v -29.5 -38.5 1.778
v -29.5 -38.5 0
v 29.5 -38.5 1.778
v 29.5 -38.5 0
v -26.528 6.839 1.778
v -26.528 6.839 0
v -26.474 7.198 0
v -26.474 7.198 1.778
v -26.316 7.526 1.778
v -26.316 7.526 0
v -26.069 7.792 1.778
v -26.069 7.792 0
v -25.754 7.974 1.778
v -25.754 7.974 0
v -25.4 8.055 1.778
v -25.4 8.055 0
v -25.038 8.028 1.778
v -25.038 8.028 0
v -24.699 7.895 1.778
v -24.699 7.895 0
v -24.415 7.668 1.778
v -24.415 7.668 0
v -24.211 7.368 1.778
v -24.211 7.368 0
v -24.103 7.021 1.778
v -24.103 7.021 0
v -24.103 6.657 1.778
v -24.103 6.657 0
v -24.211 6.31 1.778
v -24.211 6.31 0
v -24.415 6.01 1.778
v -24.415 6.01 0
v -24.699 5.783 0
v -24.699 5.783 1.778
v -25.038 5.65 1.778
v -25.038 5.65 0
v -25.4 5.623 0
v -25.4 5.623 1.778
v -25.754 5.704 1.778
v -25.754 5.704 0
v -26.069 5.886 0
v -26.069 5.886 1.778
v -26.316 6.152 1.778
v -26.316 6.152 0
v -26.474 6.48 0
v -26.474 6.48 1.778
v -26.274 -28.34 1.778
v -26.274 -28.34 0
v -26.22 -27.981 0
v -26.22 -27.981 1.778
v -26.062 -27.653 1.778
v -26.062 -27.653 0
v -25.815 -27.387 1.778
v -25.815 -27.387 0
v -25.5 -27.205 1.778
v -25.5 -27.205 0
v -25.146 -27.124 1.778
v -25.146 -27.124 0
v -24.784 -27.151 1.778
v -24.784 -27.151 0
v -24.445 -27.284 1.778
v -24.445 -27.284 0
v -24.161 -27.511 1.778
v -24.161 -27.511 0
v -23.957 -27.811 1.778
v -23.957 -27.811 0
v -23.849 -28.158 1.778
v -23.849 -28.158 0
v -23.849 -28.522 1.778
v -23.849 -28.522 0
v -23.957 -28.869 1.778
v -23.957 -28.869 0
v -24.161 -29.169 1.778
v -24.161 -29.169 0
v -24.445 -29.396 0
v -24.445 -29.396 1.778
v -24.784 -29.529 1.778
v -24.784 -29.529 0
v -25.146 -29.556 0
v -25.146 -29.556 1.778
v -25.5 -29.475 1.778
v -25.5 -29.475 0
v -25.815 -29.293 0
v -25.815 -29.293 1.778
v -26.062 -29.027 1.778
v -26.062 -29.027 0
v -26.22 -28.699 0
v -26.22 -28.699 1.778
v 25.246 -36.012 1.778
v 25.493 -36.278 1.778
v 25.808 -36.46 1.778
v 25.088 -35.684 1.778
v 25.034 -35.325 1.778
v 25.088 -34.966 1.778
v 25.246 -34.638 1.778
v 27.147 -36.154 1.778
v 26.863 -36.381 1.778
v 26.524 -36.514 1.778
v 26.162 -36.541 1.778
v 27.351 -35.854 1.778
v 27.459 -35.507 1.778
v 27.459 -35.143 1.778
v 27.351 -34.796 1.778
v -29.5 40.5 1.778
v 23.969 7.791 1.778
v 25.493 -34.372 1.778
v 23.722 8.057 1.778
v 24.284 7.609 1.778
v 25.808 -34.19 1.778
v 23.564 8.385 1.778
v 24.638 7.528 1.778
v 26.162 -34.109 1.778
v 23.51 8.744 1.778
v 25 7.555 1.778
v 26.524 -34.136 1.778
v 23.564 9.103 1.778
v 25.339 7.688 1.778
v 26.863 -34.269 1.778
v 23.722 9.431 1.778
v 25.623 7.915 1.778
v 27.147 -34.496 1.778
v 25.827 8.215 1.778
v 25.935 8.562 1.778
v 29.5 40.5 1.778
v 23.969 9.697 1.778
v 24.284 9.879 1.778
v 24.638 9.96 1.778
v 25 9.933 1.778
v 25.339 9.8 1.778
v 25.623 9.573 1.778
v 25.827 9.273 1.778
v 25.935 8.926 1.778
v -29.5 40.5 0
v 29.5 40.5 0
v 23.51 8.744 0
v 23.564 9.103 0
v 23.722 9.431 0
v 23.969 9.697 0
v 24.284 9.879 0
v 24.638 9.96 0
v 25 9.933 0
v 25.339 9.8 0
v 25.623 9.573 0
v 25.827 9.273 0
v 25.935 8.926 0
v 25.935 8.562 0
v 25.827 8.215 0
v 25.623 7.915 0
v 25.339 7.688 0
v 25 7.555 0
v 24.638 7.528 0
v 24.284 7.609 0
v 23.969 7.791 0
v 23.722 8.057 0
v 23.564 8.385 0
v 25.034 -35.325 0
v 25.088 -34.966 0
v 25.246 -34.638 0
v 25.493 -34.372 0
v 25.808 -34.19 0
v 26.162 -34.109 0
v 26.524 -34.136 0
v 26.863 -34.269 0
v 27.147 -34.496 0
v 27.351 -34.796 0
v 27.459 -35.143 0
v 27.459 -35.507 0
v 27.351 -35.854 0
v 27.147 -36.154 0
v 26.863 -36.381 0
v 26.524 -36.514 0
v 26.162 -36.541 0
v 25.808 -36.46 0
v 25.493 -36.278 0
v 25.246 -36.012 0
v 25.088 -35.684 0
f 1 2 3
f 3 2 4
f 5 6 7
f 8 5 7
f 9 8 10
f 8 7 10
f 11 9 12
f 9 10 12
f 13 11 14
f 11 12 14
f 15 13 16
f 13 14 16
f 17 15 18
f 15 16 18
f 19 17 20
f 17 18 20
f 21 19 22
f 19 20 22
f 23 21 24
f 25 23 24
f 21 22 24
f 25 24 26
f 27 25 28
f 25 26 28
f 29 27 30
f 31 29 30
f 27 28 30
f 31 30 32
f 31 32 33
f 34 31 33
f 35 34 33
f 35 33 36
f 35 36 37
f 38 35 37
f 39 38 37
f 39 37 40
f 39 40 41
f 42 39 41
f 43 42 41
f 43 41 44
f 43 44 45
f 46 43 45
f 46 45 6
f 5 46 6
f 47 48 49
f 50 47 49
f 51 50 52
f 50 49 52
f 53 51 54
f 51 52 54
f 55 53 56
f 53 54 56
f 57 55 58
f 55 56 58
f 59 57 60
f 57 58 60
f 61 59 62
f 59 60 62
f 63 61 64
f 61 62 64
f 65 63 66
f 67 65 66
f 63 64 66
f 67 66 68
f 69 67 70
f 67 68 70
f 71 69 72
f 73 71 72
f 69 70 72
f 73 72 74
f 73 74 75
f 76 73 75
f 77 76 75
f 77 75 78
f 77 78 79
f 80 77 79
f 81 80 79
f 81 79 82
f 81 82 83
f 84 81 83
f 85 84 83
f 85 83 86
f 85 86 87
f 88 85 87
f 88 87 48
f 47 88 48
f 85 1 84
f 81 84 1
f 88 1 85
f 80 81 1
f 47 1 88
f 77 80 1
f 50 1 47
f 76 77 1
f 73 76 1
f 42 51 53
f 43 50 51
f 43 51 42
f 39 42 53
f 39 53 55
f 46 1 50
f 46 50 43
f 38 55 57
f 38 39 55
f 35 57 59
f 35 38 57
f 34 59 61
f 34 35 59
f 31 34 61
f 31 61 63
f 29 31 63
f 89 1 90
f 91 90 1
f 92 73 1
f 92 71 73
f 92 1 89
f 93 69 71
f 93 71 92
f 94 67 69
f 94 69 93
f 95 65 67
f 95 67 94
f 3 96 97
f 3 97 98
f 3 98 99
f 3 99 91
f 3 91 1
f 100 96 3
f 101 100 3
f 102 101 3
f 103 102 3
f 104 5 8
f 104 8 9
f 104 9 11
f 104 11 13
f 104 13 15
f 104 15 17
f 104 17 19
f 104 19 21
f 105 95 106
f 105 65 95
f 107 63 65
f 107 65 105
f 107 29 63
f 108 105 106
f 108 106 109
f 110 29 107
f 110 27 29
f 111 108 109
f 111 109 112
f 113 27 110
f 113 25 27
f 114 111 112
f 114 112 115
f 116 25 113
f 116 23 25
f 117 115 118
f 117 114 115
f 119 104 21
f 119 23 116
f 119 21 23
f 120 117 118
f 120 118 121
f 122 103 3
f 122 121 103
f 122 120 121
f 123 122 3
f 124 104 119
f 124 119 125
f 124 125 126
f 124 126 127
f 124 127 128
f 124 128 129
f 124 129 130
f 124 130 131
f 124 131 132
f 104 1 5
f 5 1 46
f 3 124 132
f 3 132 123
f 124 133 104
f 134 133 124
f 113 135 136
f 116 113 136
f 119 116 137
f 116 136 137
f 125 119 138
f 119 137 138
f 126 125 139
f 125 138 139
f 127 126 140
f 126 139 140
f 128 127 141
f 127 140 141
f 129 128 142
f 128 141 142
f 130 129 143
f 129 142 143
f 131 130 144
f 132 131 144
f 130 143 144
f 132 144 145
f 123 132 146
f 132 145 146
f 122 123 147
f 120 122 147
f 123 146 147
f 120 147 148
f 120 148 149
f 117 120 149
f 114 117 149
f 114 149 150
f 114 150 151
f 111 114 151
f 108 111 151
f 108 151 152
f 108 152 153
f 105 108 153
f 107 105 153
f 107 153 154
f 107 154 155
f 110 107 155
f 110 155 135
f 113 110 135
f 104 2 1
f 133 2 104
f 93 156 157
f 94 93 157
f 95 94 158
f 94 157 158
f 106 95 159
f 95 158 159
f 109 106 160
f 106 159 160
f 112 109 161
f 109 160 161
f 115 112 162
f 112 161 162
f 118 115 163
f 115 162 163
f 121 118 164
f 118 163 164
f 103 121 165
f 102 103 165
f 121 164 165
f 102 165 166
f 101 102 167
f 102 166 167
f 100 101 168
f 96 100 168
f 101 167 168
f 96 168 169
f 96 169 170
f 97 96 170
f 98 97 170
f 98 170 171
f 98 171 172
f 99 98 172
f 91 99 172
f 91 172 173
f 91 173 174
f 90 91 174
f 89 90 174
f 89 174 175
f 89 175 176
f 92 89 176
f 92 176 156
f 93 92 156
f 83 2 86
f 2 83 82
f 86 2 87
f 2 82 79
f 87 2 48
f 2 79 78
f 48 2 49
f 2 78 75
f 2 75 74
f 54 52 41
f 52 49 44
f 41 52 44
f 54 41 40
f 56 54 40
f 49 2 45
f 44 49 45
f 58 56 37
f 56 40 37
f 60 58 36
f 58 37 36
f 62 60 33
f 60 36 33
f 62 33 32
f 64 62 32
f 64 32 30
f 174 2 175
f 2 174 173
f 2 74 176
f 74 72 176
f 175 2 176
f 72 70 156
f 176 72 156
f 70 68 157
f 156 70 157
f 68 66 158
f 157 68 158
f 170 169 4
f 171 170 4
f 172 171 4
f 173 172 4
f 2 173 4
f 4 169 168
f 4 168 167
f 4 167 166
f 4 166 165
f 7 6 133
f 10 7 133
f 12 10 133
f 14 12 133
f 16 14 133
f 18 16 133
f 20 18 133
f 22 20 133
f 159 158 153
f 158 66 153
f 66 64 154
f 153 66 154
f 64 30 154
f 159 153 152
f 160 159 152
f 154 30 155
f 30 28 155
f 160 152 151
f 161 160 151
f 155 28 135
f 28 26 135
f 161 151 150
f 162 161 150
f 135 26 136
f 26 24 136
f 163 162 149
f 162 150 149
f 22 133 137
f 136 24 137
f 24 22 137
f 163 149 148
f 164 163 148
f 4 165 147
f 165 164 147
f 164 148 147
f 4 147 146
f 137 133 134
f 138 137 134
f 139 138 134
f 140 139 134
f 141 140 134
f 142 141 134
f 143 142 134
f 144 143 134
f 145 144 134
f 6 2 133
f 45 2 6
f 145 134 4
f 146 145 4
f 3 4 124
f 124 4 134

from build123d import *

# Parameters (mm, degrees)
SKETCH1_W                 = 59
SKETCH1_H                 = 79
EXTRUDE1_DEPTH            = 1.778
F_2_CLEARANCE_HOLE1_D     = 2.4384
F_2_CLEARANCE_HOLE1_DEPTH = 6.35
F_2_CLEARANCE_HOLE1_TIP   = 0.732569267


with BuildPart() as part:
    # Sketch1 → Extrude1 (new body)
    with BuildSketch(Plane.XY):
        with Locations((0, 1)):
            Rectangle(SKETCH1_W, SKETCH1_H)
    extrude(amount=EXTRUDE1_DEPTH)

    # #2 Clearance Hole1
    with Locations(Plane(origin=(-25.055, -28.34, 1.778), x_dir=(1, 0, 0), z_dir=(0, 0, 1))):
        with Locations((0, 0), (-0.254, 35.179), (49.784, 37.084), (51.308, -6.985)):
            Hole(F_2_CLEARANCE_HOLE1_D / 2, depth=F_2_CLEARANCE_HOLE1_DEPTH)
            with Locations((0, 0, -(F_2_CLEARANCE_HOLE1_DEPTH + F_2_CLEARANCE_HOLE1_TIP / 2))):  # 118° drill point
                Cone(0, F_2_CLEARANCE_HOLE1_D / 2, F_2_CLEARANCE_HOLE1_TIP, mode=Mode.SUBTRACT)


solid = part.part
